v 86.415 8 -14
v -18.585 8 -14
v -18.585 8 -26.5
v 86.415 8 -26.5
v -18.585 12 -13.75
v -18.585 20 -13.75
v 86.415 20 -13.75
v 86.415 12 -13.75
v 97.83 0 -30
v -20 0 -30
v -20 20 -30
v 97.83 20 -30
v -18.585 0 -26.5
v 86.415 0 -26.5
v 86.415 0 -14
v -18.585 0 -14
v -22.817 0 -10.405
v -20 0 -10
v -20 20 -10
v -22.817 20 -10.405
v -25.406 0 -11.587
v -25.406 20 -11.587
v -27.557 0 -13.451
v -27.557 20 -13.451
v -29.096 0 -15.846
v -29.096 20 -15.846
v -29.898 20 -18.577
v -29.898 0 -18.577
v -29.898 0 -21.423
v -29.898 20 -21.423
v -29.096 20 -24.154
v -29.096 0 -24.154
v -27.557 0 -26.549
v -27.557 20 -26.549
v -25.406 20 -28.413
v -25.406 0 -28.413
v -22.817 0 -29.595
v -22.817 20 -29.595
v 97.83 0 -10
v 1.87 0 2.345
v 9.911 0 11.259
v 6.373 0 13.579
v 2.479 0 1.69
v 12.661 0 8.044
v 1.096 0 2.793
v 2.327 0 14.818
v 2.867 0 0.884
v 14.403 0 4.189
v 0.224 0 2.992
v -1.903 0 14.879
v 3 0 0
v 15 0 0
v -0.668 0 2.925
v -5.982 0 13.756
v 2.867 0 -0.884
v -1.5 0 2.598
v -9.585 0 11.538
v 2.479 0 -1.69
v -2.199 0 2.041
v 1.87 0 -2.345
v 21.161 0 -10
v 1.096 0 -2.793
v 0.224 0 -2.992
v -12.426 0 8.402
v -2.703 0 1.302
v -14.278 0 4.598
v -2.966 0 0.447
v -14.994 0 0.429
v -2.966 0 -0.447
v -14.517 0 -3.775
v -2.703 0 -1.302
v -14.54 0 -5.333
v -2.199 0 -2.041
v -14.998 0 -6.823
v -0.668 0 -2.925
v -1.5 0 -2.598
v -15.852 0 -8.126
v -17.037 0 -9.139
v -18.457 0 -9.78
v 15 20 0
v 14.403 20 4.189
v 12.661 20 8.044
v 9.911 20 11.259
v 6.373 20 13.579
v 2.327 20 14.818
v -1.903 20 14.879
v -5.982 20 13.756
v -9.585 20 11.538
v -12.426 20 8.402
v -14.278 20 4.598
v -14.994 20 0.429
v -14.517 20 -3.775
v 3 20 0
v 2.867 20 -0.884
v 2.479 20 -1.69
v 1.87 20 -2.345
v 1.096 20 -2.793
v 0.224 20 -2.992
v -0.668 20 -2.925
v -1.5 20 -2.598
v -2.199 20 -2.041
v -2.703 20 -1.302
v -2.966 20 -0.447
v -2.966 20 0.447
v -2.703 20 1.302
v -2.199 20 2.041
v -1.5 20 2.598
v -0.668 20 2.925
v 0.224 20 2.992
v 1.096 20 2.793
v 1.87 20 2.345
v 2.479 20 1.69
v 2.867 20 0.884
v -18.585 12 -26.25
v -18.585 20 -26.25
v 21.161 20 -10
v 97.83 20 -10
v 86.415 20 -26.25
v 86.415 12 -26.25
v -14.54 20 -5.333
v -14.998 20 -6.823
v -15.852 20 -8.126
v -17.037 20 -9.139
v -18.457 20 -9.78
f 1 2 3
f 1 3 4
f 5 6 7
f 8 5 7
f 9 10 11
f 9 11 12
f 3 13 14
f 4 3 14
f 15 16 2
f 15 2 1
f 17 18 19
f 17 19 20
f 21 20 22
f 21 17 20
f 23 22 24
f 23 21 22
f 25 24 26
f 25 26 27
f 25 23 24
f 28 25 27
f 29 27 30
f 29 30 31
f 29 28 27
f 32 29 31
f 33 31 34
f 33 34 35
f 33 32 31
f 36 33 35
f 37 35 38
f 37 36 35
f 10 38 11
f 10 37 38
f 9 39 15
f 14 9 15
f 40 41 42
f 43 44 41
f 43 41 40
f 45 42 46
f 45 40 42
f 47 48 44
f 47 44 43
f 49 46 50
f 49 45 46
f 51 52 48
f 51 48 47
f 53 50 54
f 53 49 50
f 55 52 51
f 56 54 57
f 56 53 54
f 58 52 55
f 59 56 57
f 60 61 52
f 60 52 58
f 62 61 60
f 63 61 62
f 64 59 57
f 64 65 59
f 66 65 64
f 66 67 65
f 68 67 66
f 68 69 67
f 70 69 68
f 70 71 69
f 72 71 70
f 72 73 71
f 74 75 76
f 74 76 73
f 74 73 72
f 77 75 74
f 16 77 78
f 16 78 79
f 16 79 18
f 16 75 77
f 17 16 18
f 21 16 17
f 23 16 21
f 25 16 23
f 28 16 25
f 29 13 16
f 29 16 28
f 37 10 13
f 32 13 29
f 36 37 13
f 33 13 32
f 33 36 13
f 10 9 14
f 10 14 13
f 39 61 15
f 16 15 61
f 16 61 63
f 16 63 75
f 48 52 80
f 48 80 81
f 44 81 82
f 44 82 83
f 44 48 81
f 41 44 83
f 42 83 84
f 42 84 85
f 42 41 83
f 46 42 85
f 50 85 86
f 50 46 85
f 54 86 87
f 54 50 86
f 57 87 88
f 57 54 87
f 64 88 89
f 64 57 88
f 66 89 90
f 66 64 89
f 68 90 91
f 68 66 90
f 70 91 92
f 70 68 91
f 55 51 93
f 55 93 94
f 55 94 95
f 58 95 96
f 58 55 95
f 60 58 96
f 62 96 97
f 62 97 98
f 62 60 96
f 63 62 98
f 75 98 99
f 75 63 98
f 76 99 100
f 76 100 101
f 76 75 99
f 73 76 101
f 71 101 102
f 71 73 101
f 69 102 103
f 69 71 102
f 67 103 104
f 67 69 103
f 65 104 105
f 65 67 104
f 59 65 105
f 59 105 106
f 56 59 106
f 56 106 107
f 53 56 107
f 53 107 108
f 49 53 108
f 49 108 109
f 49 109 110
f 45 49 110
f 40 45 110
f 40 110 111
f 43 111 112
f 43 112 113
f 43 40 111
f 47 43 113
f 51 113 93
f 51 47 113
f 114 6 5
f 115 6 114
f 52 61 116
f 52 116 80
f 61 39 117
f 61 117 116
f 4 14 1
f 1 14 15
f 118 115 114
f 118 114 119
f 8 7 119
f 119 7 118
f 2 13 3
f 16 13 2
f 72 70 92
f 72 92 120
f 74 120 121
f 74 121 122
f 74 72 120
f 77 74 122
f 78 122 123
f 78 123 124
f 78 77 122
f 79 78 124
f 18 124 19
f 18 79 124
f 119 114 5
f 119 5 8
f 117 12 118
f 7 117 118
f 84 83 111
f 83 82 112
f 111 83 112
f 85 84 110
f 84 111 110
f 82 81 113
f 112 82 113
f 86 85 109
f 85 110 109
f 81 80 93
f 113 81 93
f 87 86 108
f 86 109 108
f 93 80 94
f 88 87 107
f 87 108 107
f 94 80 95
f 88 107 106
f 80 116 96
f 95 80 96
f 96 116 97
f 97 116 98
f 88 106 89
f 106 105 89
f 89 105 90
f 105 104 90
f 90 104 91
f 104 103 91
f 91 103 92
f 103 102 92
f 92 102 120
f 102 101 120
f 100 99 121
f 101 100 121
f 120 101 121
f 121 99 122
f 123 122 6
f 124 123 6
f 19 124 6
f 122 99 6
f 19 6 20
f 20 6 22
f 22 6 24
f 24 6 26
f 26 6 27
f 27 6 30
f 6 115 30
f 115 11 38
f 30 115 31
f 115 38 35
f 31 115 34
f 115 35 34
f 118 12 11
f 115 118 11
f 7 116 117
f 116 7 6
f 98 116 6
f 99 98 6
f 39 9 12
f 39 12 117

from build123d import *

# Parameters (mm, degrees)
SKETCH1_R           = 3
BOSS_EXTRUDE1_DEPTH = 20
SKETCH8_W           = 105
SKETCH8_H           = 12.5
CUT_EXTRUDE7_DEPTH  = 8
SKETCH9_W           = 105
SKETCH9_H           = 12.5
CUT_EXTRUDE8_DEPTH  = 8


with BuildPart() as part:
    # Sketch1 → Boss-Extrude1 (new body)
    with BuildSketch(Plane(origin=(0, 0, 0), x_dir=(1, 0, 0), z_dir=(0, 1, 0))):
        with BuildLine():
            Line((-20, 30), (97.83, 30))
            Line((97.83, 30), (97.83, 10))
            Line((97.83, 10), (21.160500507, 10))
            Line((21.160500507, 10), (15, 0))
            ThreePointArc((15, 0), (-1.903014387, -14.878794852), (-14.517138166, 3.775274755))
            ThreePointArc((-14.517138166, 3.775274755), (-15.852441132, 8.126182851), (-20, 10))
            ThreePointArc((-20, 10), (-30, 20), (-20, 30))
        make_face()
        Circle(SKETCH1_R, mode=Mode.SUBTRACT)
    extrude(amount=BOSS_EXTRUDE1_DEPTH)

    # Sketch8 → Cut-Extrude7 (cut)
    with BuildSketch(Plane.XZ):
        with Locations((33.915, -20.25)):
            Rectangle(SKETCH8_W, SKETCH8_H)
    extrude(amount=-CUT_EXTRUDE7_DEPTH, mode=Mode.SUBTRACT)

    # Sketch9 → Cut-Extrude8 (cut)
    with BuildSketch(Plane(origin=(0, 20, 0), x_dir=(1, 0, 0), z_dir=(0, 1, 0))):
        with Locations((33.915, 20)):
            Rectangle(SKETCH9_W, SKETCH9_H)
    extrude(amount=-CUT_EXTRUDE8_DEPTH, mode=Mode.SUBTRACT)


solid = part.part
